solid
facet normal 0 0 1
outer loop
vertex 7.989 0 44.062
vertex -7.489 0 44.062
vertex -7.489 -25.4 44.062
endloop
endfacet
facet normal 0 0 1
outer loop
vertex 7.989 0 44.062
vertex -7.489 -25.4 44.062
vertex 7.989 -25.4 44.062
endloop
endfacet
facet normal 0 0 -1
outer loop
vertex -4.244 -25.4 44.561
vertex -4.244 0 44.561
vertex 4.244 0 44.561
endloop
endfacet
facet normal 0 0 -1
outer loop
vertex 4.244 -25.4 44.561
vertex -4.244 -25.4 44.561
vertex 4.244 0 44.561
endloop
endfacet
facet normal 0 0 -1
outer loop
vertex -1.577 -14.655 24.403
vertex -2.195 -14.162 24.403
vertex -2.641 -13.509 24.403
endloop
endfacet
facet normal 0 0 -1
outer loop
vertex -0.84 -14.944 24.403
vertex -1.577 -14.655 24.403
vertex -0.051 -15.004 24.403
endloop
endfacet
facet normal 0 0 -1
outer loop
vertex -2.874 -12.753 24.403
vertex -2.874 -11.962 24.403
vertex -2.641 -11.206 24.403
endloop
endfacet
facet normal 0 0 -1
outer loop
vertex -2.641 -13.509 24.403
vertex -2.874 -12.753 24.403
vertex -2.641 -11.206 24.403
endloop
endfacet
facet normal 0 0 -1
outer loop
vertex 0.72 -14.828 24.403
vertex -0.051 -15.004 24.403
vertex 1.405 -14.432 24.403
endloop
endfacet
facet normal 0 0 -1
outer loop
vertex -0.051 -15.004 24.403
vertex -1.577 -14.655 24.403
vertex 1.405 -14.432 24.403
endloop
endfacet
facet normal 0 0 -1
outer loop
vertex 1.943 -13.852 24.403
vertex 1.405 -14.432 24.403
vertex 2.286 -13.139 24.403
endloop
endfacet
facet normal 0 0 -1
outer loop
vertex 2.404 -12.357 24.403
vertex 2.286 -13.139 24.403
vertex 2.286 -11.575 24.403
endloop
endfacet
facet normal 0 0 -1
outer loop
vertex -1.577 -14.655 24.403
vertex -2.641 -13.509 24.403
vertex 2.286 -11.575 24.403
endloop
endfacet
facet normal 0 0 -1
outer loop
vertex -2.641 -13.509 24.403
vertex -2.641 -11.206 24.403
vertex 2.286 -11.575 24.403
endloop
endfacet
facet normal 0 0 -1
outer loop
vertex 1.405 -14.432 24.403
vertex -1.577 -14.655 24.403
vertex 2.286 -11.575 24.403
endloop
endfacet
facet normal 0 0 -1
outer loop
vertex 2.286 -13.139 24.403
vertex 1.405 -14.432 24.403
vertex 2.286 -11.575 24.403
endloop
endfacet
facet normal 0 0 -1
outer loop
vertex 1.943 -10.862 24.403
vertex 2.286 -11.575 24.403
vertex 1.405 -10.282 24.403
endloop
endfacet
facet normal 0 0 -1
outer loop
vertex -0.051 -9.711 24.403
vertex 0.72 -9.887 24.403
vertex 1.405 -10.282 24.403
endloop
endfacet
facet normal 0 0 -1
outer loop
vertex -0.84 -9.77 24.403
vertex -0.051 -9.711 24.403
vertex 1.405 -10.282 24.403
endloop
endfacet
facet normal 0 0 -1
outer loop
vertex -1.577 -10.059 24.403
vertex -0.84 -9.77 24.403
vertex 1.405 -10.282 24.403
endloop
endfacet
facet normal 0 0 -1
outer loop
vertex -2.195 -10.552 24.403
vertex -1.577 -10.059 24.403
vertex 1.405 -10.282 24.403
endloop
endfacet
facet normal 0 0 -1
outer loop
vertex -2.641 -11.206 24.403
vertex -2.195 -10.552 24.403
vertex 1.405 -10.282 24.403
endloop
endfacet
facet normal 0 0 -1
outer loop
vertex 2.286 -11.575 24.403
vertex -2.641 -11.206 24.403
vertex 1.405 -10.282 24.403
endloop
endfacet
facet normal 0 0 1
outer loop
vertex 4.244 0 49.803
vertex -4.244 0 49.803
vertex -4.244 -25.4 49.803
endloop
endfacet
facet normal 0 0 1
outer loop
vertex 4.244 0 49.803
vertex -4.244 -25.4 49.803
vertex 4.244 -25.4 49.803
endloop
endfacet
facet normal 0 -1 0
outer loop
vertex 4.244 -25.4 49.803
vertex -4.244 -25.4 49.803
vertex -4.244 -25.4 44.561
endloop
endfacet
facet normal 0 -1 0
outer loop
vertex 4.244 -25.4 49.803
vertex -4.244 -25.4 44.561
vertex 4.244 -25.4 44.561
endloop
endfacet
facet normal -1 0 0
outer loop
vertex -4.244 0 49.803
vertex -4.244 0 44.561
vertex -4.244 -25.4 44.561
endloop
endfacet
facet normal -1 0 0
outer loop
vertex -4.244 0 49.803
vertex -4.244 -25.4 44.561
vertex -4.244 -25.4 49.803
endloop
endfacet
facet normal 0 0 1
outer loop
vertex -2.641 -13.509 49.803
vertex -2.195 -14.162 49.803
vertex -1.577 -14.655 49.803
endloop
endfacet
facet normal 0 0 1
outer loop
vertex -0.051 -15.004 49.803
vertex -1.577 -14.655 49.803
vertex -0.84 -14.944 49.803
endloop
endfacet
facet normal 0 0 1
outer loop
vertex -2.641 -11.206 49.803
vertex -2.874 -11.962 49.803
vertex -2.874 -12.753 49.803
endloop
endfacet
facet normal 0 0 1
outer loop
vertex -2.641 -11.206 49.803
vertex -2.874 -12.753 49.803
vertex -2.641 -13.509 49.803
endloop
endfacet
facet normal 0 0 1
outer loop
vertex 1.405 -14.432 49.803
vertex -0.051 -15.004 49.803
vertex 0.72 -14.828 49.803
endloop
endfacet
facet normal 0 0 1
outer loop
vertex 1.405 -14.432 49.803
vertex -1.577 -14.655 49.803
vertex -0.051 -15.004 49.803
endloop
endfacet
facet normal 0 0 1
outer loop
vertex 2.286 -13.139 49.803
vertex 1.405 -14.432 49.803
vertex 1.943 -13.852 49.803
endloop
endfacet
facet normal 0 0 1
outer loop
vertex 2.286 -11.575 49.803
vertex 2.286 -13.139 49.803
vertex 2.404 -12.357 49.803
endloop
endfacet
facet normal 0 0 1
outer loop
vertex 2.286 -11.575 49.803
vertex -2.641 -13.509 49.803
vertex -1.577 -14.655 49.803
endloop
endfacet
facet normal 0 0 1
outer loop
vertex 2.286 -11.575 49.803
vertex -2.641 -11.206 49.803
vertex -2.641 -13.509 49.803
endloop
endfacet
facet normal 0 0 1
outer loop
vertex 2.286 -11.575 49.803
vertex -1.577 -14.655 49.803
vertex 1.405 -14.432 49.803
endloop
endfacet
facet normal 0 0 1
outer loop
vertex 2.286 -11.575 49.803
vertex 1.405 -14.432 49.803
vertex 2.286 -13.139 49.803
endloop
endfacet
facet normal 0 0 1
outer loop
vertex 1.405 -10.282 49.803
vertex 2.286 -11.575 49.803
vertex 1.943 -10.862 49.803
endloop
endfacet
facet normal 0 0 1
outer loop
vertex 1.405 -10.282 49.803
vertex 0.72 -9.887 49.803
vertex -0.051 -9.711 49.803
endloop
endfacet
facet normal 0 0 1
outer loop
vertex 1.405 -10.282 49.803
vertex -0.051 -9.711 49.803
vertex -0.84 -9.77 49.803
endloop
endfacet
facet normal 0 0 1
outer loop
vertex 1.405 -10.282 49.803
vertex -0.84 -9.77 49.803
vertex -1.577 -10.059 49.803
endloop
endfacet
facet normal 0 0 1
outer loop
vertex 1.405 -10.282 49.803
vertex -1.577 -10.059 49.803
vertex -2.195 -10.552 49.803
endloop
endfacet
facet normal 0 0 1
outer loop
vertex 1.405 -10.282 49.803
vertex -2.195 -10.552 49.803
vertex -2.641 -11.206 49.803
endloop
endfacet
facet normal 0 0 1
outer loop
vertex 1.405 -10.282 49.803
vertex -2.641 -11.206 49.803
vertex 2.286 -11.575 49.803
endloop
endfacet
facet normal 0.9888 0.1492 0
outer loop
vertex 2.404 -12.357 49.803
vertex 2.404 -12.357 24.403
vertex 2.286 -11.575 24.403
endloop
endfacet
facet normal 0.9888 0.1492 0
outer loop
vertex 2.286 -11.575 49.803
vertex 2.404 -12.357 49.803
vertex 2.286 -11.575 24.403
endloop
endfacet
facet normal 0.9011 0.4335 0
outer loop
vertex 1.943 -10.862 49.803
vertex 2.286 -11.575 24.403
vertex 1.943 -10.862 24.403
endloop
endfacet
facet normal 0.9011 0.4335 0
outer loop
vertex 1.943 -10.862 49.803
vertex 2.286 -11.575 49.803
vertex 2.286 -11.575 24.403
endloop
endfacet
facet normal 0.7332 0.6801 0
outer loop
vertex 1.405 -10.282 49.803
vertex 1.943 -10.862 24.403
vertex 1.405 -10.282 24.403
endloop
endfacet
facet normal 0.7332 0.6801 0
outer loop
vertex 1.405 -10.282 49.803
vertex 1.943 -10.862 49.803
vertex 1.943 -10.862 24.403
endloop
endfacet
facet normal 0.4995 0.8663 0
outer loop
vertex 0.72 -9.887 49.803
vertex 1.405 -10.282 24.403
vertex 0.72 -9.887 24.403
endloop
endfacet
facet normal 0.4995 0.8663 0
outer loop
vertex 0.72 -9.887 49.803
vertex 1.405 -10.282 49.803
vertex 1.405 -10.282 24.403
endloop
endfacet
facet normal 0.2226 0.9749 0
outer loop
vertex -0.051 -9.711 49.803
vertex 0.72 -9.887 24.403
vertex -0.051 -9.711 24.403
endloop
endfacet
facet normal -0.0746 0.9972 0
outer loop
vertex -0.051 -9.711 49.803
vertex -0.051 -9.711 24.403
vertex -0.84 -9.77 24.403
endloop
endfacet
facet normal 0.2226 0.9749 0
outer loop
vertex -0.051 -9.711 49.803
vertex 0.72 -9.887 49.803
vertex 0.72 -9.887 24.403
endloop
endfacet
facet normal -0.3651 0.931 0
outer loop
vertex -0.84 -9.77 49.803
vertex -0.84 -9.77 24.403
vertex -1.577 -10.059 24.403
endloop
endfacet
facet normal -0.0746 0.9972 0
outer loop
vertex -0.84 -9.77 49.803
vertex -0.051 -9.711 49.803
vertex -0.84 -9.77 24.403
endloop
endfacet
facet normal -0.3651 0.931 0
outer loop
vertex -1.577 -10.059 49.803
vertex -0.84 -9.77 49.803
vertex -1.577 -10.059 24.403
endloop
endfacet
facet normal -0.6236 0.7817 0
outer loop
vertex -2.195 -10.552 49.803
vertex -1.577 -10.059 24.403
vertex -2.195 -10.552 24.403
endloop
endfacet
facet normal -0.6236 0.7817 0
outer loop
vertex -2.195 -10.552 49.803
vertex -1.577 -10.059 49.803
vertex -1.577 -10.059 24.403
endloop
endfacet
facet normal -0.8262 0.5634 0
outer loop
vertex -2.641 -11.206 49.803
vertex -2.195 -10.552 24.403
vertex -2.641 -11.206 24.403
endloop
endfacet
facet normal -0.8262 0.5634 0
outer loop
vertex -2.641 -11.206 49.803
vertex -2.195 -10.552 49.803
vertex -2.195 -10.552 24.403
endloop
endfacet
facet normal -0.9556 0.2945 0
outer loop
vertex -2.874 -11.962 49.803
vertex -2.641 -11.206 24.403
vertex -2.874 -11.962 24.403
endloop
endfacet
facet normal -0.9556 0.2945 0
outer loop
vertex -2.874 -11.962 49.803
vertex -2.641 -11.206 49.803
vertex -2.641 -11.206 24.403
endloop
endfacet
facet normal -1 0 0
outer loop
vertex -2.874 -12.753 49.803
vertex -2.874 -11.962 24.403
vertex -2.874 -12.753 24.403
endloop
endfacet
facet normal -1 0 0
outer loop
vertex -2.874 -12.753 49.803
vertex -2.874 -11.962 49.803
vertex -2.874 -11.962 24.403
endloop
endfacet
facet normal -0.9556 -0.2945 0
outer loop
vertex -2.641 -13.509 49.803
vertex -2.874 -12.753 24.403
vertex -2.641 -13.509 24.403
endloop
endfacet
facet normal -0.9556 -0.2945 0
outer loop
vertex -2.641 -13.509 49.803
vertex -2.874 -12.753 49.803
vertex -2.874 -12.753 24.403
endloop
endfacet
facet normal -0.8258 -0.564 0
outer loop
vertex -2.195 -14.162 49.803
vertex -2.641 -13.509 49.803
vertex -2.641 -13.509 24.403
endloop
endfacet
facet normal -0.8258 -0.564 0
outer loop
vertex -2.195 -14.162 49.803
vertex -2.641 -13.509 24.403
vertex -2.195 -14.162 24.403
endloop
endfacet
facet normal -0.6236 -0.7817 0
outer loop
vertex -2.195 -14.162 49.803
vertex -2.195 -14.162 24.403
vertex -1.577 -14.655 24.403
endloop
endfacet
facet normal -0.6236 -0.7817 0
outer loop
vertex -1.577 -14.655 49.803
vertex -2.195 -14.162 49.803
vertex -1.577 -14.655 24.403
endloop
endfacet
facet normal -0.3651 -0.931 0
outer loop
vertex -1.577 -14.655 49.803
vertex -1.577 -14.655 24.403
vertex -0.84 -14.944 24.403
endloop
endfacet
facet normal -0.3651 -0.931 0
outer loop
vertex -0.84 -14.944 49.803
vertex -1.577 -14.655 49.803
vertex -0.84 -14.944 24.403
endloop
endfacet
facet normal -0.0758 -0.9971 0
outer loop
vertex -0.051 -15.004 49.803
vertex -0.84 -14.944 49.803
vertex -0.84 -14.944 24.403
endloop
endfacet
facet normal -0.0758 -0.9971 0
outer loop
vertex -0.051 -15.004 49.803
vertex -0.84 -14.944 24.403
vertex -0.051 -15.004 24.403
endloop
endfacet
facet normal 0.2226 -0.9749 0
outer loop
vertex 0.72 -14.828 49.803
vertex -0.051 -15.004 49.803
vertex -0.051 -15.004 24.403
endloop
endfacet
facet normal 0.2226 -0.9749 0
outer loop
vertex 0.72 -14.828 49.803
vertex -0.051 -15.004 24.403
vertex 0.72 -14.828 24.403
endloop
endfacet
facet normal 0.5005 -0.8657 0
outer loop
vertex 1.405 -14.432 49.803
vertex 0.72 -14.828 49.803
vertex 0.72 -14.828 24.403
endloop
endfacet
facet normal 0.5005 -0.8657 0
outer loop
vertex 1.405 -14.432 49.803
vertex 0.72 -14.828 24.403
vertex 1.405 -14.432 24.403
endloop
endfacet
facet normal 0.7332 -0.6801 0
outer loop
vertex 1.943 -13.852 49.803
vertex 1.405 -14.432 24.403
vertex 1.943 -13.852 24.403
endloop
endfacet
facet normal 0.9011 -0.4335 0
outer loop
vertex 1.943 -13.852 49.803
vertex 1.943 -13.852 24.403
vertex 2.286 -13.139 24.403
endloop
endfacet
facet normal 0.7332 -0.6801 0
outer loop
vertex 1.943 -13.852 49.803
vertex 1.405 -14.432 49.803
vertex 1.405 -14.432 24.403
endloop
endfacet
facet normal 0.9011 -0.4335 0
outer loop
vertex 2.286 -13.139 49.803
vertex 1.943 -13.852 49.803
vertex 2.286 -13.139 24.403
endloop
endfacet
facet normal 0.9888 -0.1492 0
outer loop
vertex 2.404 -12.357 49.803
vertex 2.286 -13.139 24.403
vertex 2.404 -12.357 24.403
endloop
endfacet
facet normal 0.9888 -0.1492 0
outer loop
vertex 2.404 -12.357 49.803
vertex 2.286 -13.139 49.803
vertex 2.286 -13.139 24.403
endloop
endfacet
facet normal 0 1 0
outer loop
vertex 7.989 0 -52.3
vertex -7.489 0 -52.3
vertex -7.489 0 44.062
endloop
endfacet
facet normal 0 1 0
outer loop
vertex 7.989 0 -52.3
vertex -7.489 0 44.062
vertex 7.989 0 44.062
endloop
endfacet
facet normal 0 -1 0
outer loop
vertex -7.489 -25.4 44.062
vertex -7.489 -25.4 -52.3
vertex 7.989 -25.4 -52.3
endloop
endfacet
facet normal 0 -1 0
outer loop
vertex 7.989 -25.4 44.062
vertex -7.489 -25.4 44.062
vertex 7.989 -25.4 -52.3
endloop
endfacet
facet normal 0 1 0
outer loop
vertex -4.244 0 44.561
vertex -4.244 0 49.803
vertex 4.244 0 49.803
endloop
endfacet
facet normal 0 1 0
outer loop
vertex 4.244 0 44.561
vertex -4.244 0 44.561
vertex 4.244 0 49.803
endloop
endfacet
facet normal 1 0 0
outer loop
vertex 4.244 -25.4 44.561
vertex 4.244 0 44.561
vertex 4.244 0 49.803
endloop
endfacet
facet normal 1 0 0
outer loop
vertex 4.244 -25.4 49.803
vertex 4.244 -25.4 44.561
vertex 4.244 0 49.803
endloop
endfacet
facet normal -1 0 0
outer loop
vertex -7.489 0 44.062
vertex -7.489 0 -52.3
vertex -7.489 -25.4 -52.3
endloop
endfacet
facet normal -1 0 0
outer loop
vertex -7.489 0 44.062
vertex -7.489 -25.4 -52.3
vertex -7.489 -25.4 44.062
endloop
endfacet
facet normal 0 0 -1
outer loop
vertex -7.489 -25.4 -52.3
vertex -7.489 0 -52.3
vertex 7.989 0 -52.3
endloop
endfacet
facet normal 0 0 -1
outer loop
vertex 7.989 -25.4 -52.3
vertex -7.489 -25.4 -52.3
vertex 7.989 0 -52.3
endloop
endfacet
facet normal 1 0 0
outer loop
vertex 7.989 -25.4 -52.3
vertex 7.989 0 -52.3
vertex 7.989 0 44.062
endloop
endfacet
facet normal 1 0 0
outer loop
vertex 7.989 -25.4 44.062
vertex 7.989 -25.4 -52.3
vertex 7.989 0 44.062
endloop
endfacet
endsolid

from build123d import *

# Parameters (mm, degrees)
F0_W     = 15.477753
F0_H     = 96.361499
F0_W_2   = 8.487801
F0_H_2   = 5.242463
F1_DEPTH = 25.4
F2_R     = 2.653724
F3_DEPTH = 25.4


with BuildPart() as f1:
    # F0 (on Front) → F1 (new body)
    with BuildSketch(Plane.XZ):
        with Locations((0.249642, -4.119077)):
            Rectangle(F0_W, F0_H)
        with Locations((-1e-06, 47.182185)):
            Rectangle(F0_W_2, F0_H_2)
    extrude(amount=F1_DEPTH)


with BuildPart() as f3:
    # F2 (on face) → F3 (new body)
    with BuildSketch(Plane.XY.offset(49.803417)):
        with Locations((-0.249641, -12.35724)):
            Circle(F2_R)
    extrude(amount=-F3_DEPTH)


solid = Compound([f1.part, f3.part])
